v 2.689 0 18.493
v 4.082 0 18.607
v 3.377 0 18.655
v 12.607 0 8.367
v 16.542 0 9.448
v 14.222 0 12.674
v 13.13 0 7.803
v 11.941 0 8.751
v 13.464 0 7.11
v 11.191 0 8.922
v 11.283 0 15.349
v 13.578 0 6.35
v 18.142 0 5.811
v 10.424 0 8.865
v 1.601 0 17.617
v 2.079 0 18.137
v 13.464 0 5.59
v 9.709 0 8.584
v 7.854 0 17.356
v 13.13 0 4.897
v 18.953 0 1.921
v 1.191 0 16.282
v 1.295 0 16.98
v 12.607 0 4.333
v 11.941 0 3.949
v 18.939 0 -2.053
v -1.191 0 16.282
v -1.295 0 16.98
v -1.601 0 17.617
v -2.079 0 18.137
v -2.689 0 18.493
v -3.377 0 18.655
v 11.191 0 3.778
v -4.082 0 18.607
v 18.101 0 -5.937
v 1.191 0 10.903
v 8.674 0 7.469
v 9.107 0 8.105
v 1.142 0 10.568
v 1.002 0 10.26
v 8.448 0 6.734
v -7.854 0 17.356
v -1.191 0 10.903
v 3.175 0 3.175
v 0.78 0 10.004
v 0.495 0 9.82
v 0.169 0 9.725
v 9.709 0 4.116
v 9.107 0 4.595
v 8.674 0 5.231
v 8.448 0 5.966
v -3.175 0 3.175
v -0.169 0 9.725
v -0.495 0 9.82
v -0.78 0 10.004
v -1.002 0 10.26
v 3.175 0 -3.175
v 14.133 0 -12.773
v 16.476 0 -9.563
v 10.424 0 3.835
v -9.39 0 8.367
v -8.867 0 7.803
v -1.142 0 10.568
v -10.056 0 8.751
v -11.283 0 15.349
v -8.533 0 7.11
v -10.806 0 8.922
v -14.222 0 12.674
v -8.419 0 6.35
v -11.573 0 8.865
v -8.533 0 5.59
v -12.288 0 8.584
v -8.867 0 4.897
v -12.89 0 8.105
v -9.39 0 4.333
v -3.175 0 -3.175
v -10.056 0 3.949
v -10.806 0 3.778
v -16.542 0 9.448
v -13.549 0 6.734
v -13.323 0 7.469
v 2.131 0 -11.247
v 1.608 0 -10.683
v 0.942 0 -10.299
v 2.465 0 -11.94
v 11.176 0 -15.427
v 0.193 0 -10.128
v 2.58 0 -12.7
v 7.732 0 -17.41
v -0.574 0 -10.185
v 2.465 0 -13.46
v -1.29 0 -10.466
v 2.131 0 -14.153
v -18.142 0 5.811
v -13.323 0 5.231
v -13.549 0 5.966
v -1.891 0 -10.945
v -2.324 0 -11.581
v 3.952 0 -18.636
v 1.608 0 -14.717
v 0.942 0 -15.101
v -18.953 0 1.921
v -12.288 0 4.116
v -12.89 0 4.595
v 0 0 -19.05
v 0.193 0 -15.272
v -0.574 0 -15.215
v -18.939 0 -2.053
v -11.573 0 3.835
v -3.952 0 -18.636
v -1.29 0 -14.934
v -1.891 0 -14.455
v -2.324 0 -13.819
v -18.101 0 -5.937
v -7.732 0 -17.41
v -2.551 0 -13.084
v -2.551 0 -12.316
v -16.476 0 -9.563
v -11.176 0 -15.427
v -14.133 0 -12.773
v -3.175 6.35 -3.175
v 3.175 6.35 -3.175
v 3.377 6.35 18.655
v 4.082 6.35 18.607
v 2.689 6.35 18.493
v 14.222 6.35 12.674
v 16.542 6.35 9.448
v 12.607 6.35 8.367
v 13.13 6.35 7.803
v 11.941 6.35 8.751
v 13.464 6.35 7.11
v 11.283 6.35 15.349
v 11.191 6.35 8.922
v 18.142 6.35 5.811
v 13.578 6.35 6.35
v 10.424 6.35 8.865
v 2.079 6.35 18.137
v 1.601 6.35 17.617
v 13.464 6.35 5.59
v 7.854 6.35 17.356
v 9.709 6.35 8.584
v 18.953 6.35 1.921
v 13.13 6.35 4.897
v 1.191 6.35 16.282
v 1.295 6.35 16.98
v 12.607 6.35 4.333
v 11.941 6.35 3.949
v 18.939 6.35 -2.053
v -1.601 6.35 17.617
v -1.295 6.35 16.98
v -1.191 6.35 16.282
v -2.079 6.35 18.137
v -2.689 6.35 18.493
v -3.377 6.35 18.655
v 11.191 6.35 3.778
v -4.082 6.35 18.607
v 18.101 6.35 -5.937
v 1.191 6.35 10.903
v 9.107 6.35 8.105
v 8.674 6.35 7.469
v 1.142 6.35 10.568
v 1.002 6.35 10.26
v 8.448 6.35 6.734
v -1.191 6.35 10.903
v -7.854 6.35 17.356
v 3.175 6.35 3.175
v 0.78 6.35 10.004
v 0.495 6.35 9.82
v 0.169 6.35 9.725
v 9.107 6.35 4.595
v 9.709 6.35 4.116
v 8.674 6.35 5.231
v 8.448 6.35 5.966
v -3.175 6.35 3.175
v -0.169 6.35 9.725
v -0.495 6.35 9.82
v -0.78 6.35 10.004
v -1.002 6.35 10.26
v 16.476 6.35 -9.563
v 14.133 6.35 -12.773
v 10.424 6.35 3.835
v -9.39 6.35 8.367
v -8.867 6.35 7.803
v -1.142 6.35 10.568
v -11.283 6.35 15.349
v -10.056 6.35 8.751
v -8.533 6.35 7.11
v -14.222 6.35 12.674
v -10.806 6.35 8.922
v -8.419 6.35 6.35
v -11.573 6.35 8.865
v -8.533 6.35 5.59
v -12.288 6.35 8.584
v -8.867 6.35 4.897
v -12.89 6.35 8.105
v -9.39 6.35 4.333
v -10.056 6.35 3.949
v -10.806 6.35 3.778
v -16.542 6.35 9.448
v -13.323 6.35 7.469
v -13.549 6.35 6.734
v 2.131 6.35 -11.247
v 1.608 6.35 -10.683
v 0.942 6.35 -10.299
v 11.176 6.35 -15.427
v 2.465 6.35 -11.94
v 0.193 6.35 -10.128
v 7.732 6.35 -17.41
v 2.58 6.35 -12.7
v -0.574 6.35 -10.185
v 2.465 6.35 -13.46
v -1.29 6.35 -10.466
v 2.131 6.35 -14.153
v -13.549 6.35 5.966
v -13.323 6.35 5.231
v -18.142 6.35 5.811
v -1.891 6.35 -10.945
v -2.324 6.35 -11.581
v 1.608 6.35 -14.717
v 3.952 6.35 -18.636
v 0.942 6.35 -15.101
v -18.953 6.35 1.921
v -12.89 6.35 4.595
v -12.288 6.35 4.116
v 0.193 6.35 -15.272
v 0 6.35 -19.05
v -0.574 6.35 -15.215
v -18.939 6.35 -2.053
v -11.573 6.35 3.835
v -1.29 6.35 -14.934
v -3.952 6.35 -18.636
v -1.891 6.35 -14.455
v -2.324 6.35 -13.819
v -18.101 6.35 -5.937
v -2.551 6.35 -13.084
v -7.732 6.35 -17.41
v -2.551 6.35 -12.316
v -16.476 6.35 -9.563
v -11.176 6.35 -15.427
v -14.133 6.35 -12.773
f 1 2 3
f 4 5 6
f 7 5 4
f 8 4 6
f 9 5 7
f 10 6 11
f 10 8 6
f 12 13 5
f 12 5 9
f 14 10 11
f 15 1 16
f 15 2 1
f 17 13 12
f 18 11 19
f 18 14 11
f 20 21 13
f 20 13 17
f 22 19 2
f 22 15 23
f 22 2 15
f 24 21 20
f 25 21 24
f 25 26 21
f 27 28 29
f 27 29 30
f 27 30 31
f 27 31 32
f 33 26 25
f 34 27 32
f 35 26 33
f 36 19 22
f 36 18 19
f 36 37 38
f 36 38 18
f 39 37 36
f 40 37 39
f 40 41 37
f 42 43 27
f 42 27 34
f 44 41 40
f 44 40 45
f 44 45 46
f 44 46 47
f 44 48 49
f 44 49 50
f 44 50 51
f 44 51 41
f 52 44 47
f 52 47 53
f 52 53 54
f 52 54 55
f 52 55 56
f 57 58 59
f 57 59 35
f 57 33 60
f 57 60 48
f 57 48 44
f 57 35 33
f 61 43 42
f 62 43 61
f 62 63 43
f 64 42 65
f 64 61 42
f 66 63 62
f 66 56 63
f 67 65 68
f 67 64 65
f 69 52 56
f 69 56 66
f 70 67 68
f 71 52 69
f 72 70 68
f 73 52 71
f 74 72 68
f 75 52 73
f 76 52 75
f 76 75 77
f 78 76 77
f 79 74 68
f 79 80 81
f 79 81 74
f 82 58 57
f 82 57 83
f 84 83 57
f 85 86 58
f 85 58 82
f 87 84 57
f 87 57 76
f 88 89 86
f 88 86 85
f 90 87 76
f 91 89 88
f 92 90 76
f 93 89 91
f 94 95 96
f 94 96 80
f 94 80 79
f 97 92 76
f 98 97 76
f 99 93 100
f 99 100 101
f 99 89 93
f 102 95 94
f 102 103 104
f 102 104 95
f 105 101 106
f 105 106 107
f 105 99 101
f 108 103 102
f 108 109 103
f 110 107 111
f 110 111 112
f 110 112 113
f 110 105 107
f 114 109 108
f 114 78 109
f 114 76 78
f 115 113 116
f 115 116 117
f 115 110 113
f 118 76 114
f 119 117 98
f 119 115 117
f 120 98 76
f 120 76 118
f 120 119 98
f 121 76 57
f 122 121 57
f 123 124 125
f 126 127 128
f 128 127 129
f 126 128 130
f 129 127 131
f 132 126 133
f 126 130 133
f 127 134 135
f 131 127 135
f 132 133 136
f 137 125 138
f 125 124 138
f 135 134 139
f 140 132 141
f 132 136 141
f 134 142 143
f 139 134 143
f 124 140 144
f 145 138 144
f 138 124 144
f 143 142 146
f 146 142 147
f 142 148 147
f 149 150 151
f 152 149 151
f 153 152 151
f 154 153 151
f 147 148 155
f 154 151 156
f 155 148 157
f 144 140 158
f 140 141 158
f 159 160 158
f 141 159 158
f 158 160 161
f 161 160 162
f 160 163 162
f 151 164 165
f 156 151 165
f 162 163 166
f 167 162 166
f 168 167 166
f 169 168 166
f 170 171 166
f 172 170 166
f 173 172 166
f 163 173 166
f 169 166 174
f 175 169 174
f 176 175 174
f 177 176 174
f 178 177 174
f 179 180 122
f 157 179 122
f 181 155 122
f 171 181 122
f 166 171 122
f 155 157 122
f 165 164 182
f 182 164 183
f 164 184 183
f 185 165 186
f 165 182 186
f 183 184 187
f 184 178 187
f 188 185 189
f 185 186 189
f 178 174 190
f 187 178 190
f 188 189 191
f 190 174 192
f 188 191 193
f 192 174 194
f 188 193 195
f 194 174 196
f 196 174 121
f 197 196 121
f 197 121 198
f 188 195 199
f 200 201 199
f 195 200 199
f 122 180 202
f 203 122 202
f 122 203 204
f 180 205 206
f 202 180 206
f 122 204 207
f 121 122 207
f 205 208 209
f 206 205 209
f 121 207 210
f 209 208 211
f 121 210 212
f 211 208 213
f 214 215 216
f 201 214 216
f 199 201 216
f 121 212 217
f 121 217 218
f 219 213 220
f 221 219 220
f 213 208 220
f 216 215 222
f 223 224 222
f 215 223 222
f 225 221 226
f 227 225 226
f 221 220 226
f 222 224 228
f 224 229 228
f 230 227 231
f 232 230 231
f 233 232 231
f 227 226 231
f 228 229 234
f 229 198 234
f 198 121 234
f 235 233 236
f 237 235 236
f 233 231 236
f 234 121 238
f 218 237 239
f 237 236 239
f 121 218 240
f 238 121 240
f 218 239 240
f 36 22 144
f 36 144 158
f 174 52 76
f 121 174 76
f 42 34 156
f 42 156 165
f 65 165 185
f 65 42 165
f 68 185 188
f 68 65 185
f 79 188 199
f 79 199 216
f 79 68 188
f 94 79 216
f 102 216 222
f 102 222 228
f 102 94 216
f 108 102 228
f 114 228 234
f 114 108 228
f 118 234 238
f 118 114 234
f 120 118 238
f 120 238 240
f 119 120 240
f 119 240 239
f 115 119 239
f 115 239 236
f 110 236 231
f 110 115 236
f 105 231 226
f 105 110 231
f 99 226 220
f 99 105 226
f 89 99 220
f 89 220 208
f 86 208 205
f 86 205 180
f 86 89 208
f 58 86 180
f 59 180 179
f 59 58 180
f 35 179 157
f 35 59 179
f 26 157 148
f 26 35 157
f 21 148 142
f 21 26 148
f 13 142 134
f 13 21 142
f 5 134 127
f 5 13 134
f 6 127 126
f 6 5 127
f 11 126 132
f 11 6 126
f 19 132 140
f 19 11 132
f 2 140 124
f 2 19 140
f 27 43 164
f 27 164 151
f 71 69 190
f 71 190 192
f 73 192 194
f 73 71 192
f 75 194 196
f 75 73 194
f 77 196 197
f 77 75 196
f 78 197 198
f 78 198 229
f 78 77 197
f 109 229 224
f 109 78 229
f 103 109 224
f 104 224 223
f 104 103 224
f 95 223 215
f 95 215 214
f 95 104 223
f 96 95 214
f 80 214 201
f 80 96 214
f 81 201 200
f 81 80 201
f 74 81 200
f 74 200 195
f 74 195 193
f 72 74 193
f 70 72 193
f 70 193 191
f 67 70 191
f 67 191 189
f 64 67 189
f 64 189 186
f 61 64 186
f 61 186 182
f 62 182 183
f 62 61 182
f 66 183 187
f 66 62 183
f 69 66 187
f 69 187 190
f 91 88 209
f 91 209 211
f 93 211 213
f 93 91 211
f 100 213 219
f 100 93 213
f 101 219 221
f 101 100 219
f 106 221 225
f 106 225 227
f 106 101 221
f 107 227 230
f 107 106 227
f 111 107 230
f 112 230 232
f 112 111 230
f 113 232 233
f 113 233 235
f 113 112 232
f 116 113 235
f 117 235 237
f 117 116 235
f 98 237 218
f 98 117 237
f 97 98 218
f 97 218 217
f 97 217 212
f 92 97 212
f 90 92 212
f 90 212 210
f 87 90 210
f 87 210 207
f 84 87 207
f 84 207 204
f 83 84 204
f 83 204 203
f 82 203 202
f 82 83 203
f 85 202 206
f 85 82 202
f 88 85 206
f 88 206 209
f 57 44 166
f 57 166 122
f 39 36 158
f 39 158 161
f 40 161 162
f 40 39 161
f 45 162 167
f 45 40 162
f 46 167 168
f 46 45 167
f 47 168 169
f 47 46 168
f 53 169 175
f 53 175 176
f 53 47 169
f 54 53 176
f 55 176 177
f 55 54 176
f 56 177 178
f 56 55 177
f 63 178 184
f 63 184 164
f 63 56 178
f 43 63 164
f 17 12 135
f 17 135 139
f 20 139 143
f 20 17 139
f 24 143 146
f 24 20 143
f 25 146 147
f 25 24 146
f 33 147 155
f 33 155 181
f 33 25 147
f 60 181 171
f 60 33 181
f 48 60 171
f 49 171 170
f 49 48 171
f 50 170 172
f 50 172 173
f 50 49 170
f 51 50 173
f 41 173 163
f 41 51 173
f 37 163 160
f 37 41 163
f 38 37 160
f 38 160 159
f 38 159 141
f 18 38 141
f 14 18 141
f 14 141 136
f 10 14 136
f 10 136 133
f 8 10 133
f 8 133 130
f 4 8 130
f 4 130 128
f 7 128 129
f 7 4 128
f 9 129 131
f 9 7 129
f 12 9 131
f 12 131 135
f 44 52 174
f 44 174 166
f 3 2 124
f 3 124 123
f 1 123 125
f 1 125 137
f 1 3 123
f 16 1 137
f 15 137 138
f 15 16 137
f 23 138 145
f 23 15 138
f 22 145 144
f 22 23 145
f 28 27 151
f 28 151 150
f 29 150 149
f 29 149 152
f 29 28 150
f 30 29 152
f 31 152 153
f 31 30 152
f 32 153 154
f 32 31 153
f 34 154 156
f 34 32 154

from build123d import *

# Parameters (mm, degrees)
SKETCH1_R           = 2.5796875
SKETCH1_W           = 6.35
SKETCH1_H           = 6.35
BOSS_EXTRUDE1_DEPTH = 6.35


with BuildPart() as part:
    # Sketch1 → Boss-Extrude1 (new body)
    with BuildSketch(Plane(origin=(0, 0, 0), x_dir=(1, 0, 0), z_dir=(0, 1, 0))):
        with BuildLine():
            Line((-1.190625, -10.903378281), (-1.190625, -16.281552001))
            ThreePointArc((-1.190625, -16.281552001), (-2.079347575, -18.137007052), (-4.082142857, -18.607488001))
            ThreePointArc((-4.082142857, -18.607488001), (0, 19.05), (4.082142857, -18.607488001))
            ThreePointArc((4.082142857, -18.607488001), (2.079347575, -18.137007052), (1.190625, -16.281552001))
            Line((1.190625, -16.281552001), (1.190625, -10.903378281))
            ThreePointArc((1.190625, -10.903378281), (0, -9.712753281), (-1.190625, -10.903378281))
        make_face()
        with Locations((0, 12.7)):
            Circle(SKETCH1_R, mode=Mode.SUBTRACT)
        with Locations((10.998522628, -6.35)):
            Circle(SKETCH1_R, mode=Mode.SUBTRACT)
        with Locations((-10.998522628, -6.35)):
            Circle(SKETCH1_R, mode=Mode.SUBTRACT)
        Rectangle(SKETCH1_W, SKETCH1_H, mode=Mode.SUBTRACT)
    extrude(amount=BOSS_EXTRUDE1_DEPTH)


solid = part.part
